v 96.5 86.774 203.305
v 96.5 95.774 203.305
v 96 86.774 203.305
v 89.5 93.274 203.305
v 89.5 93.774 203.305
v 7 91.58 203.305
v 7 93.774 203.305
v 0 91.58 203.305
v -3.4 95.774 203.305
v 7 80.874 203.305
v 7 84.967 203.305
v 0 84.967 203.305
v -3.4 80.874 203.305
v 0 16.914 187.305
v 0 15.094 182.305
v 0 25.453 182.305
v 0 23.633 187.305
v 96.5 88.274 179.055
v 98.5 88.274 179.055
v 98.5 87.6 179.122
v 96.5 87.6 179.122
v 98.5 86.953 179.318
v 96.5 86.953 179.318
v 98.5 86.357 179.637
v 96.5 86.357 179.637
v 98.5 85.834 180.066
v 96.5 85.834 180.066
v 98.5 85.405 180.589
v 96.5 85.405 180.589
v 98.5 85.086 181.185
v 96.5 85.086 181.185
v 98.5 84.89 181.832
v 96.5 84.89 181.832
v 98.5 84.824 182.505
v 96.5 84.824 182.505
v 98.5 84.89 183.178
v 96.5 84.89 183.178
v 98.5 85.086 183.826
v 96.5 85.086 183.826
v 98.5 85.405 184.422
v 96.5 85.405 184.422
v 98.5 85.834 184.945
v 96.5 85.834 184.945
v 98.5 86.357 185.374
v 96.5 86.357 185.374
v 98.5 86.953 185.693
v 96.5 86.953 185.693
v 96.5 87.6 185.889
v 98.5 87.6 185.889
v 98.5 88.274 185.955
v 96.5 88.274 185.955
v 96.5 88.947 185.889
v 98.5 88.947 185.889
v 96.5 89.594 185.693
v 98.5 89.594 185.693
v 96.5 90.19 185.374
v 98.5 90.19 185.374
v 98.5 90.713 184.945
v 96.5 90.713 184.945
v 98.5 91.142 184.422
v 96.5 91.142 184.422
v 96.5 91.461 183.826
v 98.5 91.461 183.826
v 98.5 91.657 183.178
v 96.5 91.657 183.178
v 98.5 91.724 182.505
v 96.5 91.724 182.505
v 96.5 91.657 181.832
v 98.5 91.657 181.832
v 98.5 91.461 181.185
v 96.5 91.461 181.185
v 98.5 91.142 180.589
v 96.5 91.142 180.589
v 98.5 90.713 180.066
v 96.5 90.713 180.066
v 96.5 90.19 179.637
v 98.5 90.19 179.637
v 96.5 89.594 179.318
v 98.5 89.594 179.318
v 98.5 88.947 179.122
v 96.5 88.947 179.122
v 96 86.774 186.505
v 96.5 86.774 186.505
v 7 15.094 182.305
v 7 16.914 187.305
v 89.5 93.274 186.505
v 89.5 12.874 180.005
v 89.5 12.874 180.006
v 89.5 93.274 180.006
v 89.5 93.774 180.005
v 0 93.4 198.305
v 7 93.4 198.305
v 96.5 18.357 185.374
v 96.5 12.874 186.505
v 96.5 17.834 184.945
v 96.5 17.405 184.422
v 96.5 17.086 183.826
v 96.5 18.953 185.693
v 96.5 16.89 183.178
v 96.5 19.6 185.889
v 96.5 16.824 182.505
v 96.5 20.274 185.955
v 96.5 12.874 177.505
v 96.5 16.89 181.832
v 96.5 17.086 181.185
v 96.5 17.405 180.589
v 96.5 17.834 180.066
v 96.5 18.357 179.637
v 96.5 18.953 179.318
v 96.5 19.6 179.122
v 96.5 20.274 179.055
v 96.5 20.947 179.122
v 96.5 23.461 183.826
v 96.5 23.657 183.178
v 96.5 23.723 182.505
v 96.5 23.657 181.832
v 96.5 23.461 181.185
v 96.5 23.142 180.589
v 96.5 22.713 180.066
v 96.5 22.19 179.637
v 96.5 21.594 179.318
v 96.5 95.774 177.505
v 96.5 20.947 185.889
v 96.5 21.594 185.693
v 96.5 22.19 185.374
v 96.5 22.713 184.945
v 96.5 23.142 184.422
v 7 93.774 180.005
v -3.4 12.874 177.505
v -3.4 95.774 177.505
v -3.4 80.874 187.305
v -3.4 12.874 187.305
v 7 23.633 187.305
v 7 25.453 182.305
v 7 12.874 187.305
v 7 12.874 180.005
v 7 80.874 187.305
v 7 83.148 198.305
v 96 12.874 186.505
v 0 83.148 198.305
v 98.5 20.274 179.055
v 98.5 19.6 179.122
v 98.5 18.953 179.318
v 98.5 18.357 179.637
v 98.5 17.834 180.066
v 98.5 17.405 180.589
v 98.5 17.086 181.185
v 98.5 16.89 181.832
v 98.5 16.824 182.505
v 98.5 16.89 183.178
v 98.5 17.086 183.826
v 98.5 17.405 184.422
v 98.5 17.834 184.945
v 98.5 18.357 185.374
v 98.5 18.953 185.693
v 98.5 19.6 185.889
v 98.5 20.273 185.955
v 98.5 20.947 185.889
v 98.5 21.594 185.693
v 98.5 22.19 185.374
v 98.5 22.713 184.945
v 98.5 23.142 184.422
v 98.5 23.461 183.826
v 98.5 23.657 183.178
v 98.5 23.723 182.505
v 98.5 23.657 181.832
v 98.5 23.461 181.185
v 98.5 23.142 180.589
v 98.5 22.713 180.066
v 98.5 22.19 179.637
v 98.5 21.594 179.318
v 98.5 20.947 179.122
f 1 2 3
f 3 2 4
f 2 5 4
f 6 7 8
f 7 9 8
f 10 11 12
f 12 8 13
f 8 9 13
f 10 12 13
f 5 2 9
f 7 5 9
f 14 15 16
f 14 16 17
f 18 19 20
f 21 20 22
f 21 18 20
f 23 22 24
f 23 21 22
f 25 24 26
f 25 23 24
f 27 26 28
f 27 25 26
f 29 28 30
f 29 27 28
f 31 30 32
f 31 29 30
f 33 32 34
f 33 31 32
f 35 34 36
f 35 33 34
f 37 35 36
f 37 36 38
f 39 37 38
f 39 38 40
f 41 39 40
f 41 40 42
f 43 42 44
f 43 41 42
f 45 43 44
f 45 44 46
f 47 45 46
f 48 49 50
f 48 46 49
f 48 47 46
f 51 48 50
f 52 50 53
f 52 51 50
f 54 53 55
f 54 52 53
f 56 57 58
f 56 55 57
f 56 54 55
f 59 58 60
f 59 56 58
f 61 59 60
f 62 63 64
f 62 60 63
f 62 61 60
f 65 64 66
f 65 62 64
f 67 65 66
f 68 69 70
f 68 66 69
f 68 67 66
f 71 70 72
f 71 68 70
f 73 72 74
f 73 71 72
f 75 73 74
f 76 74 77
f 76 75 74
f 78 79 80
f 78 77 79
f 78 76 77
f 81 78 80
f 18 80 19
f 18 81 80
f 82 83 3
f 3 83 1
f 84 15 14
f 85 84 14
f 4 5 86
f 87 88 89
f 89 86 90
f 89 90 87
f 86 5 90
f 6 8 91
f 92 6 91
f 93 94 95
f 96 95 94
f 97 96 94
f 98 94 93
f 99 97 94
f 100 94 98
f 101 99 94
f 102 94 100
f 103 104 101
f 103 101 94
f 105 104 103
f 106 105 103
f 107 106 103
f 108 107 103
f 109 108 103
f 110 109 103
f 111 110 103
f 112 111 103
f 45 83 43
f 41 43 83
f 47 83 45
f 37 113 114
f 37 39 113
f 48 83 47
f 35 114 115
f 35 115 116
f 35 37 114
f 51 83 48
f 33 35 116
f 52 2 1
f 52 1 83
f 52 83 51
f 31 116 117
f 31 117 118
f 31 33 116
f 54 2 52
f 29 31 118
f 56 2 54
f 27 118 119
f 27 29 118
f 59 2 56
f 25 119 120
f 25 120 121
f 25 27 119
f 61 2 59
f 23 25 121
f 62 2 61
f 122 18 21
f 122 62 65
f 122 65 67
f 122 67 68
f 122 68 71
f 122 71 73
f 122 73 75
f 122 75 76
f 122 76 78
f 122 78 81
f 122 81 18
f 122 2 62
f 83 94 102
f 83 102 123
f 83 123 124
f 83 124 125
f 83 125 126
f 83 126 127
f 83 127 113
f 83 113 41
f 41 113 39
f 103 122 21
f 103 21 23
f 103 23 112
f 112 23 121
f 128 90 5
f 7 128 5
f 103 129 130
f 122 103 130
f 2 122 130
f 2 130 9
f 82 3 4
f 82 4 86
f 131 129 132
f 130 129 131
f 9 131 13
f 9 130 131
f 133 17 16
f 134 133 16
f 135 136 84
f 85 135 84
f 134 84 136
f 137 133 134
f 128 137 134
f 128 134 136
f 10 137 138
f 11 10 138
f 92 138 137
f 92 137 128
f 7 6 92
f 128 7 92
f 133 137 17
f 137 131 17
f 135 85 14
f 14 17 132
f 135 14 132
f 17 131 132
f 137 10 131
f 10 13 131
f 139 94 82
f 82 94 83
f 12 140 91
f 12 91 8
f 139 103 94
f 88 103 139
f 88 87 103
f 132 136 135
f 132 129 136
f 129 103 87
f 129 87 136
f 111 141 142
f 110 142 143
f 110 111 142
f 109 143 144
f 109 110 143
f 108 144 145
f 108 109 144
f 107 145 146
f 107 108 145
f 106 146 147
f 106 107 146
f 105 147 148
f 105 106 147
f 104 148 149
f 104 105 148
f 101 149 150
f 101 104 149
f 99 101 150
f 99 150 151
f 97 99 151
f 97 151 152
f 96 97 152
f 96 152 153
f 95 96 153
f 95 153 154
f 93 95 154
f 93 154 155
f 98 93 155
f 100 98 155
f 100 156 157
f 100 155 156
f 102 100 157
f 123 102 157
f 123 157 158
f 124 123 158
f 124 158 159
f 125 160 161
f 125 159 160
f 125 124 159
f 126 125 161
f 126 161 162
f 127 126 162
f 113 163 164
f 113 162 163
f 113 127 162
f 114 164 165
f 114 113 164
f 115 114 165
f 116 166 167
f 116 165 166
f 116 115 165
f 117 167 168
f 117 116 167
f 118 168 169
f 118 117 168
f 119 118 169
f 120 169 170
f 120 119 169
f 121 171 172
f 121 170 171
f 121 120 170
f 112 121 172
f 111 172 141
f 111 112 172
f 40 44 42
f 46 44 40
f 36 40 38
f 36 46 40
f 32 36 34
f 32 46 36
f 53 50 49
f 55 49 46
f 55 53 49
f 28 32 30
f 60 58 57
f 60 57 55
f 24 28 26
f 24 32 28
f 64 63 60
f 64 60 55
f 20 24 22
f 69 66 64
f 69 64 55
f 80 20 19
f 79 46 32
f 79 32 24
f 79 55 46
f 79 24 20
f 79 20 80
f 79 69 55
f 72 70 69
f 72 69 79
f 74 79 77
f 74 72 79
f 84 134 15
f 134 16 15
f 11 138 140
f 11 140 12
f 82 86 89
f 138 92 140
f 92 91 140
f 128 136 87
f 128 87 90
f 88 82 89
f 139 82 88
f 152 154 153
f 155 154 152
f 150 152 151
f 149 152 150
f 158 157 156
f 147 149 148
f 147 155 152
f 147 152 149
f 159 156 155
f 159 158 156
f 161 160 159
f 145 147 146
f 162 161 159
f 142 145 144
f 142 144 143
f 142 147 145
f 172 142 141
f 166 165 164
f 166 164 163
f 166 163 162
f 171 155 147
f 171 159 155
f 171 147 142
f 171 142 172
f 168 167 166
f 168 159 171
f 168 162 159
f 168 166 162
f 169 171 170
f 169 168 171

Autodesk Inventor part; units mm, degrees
ref_plane "YZ Plane" through (0, 0, 0) normal (1, 0, 0) x (0, 1, 0)
ref_plane "XZ Plane" through (0, 0, 0) normal (0, 1, 0) x (-1, 0, 0)
ref_plane "XY Plane" through (0, 0, 0) normal (0, 0, 1) x (1, 0, 0)
sketch "Skizze1" plane through (0, 0, 0) normal (1, 0, 0) x (0, 1, 0)
  line L0 (12.7735, 187.5054) -> (12.7735, 177.5054) construction
  line L1 (12.7735, 177.5054) -> (95.7735, 177.5054) construction
  line L2 (95.7735, 177.5054) -> (95.7735, 203.5054) construction
  line L3 (91.4537, 203.5054) -> (93.2735, 198.5054) construction
  line L4 (95.7735, 203.5054) -> (80.7735, 203.5054) construction
  line L5 (93.2735, 198.5054) -> (83.2735, 198.5054) construction
  line L6 (83.2735, 198.5054) -> (85.0934, 203.5054) construction
  line L7 (80.7735, 203.5054) -> (80.7735, 187.5054) construction
  line L8 (80.7735, 187.5054) -> (12.7735, 187.5054) construction
  line L9 (12.7735, 187.5054) -> (12.7735, 177.5054) construction
  line L10 (15.2735, 182.5054) -> (17.0934, 187.5054) construction
  line L11 (25.2735, 182.5054) -> (15.2735, 182.5054) construction
  line L12 (23.4537, 187.5054) -> (25.2735, 182.5054) construction
  line L13 (95.7735, 177.5054) -> (95.7735, 203.3054)
  line L14 (95.7735, 203.3054) -> (91.5797, 203.3054)
  line L15 (91.5797, 203.3054) -> (93.3995, 198.3054)
  line L16 (93.3995, 198.3054) -> (83.1475, 198.3054)
  line L17 (83.1475, 198.3054) -> (84.9674, 203.3054)
  line L18 (84.9674, 203.3054) -> (80.8735, 203.3054)
  line L19 (80.8735, 203.3054) -> (80.8735, 187.3054)
  line L20 (80.8735, 187.3054) -> (23.6329, 187.3054)
  line L21 (23.6329, 187.3054) -> (25.4527, 182.3054)
  line L22 (25.4527, 182.3054) -> (15.0943, 182.3054)
  line L23 (15.0943, 182.3054) -> (16.9142, 187.3054)
  line L24 (16.9142, 187.3054) -> (12.8735, 187.3054)
  line L25 (12.8735, 187.3054) -> (12.8735, 177.5054)
  line L26 (12.8735, 177.5054) -> (95.7735, 177.5054)
  point P0 (0, 0)
  dimension "d0" = 0.2
  dimension "d1" = 0.05
  dimension "d2" = 0.05
  dimension "d3" = 0.1
  dimension "d4" = 0.2
  dimension "d5" = 0.1
  dimension "d6" = 0.1
  dimension "d7" = 0.1
extrude "Extrusion1" add sketch "Skizze1" along normal blind 7
sketch "Skizze2" plane through (0, 0, 0) normal (-1, 0, 0) x (0, 0, 1)
  line L0 (177.5054, 95.7735) -> (203.3054, 95.7735) projected
  line L1 (177.5054, 12.8735) -> (177.5054, 95.7735) projected
  line L2 (187.3054, 12.8735) -> (177.5054, 12.8735) projected
  line L3 (203.3054, 80.8735) -> (187.3054, 80.8735) projected
  line L4 (203.3054, 80.8735) -> (187.3054, 80.8735) projected
  line L5 (187.3054, 12.8735) -> (187.3054, 80.8735)
  line L6 (187.3054, 80.8735) -> (203.3054, 80.8735)
  line L7 (203.3054, 95.7735) -> (203.3054, 91.5797) projected
  line L8 (203.3054, 80.8735) -> (203.3054, 95.7735)
  point P0 (0, 0)
extrude "Extrusion2" add sketch "Skizze2" along normal blind 3.4
sketch "Skizze3" plane through (7, 0, 0) normal (1, 0, 0) x (0, 0, -1)
  line L0 (-177.5054, 95.7735) -> (-203.3054, 95.7735) projected
  line L1 (-177.5054, 12.8735) -> (-177.5054, 95.7735) projected
  line L2 (-177.5054, 12.8735) -> (-180.0054, 12.8735)
  line L3 (-187.3054, 12.8735) -> (-177.5054, 12.8735) projected
  line L4 (-180.0054, 12.8735) -> (-180.0054, 93.7735)
  line L5 (-177.5054, 95.7735) -> (-177.5054, 12.8735) projected
  line L6 (-180.0054, 93.7735) -> (-203.3054, 93.7735)
  line L7 (-203.3054, 95.7735) -> (-203.3054, 91.5797) projected
  line L8 (-203.3054, 93.7735) -> (-203.3054, 95.7735)
  point P0 (0, 0)
  dimension "d12" = 2.5
  dimension "d13" = 2
  dimension "d14" = 2
extrude "Extrusion3" add sketch "Skizze3" along normal blind 89.5
sketch "Skizze4" plane through (96.5, 0, 0) normal (1, 0, 0) x (0, 0, -1)
  circle A0 centre (-182.5054, 20.2735) radius 3.5 construction
  circle A1 centre (-182.5054, 88.2735) radius 3.5 construction
  circle A2 centre (-182.5054, 20.2735) radius 3.45
  circle A3 centre (-182.5054, 88.2735) radius 3.45
  point P0 (0, 0)
  dimension "d17" = 0.05
  dimension "d18" = 0.05
extrude "Extrusion4" add sketch "Skizze4" along normal blind 2
sketch "Skizze5" plane through (96.5, 0, 0) normal (1, 0, 0) x (0, 0, -1)
  line L0 (-198.9754, 90.3435) -> (-183.0054, 90.3435) construction
  line L1 (-180.0054, 17.896) -> (-180.0054, 12.8735) projected
  circle A0 centre (-182.5054, 88.2735) radius 3.5 construction
  line L2 (-203.3054, 93.7735) -> (-180.0054, 93.7735) projected
  line L3 (-180.0054, 12.8735) -> (-186.5054, 12.8735)
  line L4 (-186.5054, 12.8735) -> (-186.5054, 93.7735)
  line L5 (-186.5054, 93.7735) -> (-180.0054, 93.7735)
  line L6 (-180.0054, 93.7735) -> (-180.0054, 12.8735)
  line L7 (-203.3054, 93.7735) -> (-186.5054, 93.7735)
  line L8 (-186.5054, 93.7735) -> (-186.5054, 86.7735)
  line L9 (-186.5054, 86.7735) -> (-203.3054, 86.7735)
  line L10 (-203.3054, 86.7735) -> (-203.3054, 93.7735)
  point P0 (0, 0)
  point P1 (-186.5054, 90.3435)
  dimension "d27" = 4
  dimension "d31" = 7
extrude "Extrusion5" add sketch "Skizze5" against normal blind 7
chamfer "Fase2" distance 6.5 angle 45 1 edges at (89.5, 49.8235, 186.5054)
chamfer "Fase3" distance 6.5 angle 45 1 edges at (89.5, 86.7735, 194.9054)
equation "\"d1\" = d2"
equation "\"d14\" = d13"
properties part number "Batcap3"
